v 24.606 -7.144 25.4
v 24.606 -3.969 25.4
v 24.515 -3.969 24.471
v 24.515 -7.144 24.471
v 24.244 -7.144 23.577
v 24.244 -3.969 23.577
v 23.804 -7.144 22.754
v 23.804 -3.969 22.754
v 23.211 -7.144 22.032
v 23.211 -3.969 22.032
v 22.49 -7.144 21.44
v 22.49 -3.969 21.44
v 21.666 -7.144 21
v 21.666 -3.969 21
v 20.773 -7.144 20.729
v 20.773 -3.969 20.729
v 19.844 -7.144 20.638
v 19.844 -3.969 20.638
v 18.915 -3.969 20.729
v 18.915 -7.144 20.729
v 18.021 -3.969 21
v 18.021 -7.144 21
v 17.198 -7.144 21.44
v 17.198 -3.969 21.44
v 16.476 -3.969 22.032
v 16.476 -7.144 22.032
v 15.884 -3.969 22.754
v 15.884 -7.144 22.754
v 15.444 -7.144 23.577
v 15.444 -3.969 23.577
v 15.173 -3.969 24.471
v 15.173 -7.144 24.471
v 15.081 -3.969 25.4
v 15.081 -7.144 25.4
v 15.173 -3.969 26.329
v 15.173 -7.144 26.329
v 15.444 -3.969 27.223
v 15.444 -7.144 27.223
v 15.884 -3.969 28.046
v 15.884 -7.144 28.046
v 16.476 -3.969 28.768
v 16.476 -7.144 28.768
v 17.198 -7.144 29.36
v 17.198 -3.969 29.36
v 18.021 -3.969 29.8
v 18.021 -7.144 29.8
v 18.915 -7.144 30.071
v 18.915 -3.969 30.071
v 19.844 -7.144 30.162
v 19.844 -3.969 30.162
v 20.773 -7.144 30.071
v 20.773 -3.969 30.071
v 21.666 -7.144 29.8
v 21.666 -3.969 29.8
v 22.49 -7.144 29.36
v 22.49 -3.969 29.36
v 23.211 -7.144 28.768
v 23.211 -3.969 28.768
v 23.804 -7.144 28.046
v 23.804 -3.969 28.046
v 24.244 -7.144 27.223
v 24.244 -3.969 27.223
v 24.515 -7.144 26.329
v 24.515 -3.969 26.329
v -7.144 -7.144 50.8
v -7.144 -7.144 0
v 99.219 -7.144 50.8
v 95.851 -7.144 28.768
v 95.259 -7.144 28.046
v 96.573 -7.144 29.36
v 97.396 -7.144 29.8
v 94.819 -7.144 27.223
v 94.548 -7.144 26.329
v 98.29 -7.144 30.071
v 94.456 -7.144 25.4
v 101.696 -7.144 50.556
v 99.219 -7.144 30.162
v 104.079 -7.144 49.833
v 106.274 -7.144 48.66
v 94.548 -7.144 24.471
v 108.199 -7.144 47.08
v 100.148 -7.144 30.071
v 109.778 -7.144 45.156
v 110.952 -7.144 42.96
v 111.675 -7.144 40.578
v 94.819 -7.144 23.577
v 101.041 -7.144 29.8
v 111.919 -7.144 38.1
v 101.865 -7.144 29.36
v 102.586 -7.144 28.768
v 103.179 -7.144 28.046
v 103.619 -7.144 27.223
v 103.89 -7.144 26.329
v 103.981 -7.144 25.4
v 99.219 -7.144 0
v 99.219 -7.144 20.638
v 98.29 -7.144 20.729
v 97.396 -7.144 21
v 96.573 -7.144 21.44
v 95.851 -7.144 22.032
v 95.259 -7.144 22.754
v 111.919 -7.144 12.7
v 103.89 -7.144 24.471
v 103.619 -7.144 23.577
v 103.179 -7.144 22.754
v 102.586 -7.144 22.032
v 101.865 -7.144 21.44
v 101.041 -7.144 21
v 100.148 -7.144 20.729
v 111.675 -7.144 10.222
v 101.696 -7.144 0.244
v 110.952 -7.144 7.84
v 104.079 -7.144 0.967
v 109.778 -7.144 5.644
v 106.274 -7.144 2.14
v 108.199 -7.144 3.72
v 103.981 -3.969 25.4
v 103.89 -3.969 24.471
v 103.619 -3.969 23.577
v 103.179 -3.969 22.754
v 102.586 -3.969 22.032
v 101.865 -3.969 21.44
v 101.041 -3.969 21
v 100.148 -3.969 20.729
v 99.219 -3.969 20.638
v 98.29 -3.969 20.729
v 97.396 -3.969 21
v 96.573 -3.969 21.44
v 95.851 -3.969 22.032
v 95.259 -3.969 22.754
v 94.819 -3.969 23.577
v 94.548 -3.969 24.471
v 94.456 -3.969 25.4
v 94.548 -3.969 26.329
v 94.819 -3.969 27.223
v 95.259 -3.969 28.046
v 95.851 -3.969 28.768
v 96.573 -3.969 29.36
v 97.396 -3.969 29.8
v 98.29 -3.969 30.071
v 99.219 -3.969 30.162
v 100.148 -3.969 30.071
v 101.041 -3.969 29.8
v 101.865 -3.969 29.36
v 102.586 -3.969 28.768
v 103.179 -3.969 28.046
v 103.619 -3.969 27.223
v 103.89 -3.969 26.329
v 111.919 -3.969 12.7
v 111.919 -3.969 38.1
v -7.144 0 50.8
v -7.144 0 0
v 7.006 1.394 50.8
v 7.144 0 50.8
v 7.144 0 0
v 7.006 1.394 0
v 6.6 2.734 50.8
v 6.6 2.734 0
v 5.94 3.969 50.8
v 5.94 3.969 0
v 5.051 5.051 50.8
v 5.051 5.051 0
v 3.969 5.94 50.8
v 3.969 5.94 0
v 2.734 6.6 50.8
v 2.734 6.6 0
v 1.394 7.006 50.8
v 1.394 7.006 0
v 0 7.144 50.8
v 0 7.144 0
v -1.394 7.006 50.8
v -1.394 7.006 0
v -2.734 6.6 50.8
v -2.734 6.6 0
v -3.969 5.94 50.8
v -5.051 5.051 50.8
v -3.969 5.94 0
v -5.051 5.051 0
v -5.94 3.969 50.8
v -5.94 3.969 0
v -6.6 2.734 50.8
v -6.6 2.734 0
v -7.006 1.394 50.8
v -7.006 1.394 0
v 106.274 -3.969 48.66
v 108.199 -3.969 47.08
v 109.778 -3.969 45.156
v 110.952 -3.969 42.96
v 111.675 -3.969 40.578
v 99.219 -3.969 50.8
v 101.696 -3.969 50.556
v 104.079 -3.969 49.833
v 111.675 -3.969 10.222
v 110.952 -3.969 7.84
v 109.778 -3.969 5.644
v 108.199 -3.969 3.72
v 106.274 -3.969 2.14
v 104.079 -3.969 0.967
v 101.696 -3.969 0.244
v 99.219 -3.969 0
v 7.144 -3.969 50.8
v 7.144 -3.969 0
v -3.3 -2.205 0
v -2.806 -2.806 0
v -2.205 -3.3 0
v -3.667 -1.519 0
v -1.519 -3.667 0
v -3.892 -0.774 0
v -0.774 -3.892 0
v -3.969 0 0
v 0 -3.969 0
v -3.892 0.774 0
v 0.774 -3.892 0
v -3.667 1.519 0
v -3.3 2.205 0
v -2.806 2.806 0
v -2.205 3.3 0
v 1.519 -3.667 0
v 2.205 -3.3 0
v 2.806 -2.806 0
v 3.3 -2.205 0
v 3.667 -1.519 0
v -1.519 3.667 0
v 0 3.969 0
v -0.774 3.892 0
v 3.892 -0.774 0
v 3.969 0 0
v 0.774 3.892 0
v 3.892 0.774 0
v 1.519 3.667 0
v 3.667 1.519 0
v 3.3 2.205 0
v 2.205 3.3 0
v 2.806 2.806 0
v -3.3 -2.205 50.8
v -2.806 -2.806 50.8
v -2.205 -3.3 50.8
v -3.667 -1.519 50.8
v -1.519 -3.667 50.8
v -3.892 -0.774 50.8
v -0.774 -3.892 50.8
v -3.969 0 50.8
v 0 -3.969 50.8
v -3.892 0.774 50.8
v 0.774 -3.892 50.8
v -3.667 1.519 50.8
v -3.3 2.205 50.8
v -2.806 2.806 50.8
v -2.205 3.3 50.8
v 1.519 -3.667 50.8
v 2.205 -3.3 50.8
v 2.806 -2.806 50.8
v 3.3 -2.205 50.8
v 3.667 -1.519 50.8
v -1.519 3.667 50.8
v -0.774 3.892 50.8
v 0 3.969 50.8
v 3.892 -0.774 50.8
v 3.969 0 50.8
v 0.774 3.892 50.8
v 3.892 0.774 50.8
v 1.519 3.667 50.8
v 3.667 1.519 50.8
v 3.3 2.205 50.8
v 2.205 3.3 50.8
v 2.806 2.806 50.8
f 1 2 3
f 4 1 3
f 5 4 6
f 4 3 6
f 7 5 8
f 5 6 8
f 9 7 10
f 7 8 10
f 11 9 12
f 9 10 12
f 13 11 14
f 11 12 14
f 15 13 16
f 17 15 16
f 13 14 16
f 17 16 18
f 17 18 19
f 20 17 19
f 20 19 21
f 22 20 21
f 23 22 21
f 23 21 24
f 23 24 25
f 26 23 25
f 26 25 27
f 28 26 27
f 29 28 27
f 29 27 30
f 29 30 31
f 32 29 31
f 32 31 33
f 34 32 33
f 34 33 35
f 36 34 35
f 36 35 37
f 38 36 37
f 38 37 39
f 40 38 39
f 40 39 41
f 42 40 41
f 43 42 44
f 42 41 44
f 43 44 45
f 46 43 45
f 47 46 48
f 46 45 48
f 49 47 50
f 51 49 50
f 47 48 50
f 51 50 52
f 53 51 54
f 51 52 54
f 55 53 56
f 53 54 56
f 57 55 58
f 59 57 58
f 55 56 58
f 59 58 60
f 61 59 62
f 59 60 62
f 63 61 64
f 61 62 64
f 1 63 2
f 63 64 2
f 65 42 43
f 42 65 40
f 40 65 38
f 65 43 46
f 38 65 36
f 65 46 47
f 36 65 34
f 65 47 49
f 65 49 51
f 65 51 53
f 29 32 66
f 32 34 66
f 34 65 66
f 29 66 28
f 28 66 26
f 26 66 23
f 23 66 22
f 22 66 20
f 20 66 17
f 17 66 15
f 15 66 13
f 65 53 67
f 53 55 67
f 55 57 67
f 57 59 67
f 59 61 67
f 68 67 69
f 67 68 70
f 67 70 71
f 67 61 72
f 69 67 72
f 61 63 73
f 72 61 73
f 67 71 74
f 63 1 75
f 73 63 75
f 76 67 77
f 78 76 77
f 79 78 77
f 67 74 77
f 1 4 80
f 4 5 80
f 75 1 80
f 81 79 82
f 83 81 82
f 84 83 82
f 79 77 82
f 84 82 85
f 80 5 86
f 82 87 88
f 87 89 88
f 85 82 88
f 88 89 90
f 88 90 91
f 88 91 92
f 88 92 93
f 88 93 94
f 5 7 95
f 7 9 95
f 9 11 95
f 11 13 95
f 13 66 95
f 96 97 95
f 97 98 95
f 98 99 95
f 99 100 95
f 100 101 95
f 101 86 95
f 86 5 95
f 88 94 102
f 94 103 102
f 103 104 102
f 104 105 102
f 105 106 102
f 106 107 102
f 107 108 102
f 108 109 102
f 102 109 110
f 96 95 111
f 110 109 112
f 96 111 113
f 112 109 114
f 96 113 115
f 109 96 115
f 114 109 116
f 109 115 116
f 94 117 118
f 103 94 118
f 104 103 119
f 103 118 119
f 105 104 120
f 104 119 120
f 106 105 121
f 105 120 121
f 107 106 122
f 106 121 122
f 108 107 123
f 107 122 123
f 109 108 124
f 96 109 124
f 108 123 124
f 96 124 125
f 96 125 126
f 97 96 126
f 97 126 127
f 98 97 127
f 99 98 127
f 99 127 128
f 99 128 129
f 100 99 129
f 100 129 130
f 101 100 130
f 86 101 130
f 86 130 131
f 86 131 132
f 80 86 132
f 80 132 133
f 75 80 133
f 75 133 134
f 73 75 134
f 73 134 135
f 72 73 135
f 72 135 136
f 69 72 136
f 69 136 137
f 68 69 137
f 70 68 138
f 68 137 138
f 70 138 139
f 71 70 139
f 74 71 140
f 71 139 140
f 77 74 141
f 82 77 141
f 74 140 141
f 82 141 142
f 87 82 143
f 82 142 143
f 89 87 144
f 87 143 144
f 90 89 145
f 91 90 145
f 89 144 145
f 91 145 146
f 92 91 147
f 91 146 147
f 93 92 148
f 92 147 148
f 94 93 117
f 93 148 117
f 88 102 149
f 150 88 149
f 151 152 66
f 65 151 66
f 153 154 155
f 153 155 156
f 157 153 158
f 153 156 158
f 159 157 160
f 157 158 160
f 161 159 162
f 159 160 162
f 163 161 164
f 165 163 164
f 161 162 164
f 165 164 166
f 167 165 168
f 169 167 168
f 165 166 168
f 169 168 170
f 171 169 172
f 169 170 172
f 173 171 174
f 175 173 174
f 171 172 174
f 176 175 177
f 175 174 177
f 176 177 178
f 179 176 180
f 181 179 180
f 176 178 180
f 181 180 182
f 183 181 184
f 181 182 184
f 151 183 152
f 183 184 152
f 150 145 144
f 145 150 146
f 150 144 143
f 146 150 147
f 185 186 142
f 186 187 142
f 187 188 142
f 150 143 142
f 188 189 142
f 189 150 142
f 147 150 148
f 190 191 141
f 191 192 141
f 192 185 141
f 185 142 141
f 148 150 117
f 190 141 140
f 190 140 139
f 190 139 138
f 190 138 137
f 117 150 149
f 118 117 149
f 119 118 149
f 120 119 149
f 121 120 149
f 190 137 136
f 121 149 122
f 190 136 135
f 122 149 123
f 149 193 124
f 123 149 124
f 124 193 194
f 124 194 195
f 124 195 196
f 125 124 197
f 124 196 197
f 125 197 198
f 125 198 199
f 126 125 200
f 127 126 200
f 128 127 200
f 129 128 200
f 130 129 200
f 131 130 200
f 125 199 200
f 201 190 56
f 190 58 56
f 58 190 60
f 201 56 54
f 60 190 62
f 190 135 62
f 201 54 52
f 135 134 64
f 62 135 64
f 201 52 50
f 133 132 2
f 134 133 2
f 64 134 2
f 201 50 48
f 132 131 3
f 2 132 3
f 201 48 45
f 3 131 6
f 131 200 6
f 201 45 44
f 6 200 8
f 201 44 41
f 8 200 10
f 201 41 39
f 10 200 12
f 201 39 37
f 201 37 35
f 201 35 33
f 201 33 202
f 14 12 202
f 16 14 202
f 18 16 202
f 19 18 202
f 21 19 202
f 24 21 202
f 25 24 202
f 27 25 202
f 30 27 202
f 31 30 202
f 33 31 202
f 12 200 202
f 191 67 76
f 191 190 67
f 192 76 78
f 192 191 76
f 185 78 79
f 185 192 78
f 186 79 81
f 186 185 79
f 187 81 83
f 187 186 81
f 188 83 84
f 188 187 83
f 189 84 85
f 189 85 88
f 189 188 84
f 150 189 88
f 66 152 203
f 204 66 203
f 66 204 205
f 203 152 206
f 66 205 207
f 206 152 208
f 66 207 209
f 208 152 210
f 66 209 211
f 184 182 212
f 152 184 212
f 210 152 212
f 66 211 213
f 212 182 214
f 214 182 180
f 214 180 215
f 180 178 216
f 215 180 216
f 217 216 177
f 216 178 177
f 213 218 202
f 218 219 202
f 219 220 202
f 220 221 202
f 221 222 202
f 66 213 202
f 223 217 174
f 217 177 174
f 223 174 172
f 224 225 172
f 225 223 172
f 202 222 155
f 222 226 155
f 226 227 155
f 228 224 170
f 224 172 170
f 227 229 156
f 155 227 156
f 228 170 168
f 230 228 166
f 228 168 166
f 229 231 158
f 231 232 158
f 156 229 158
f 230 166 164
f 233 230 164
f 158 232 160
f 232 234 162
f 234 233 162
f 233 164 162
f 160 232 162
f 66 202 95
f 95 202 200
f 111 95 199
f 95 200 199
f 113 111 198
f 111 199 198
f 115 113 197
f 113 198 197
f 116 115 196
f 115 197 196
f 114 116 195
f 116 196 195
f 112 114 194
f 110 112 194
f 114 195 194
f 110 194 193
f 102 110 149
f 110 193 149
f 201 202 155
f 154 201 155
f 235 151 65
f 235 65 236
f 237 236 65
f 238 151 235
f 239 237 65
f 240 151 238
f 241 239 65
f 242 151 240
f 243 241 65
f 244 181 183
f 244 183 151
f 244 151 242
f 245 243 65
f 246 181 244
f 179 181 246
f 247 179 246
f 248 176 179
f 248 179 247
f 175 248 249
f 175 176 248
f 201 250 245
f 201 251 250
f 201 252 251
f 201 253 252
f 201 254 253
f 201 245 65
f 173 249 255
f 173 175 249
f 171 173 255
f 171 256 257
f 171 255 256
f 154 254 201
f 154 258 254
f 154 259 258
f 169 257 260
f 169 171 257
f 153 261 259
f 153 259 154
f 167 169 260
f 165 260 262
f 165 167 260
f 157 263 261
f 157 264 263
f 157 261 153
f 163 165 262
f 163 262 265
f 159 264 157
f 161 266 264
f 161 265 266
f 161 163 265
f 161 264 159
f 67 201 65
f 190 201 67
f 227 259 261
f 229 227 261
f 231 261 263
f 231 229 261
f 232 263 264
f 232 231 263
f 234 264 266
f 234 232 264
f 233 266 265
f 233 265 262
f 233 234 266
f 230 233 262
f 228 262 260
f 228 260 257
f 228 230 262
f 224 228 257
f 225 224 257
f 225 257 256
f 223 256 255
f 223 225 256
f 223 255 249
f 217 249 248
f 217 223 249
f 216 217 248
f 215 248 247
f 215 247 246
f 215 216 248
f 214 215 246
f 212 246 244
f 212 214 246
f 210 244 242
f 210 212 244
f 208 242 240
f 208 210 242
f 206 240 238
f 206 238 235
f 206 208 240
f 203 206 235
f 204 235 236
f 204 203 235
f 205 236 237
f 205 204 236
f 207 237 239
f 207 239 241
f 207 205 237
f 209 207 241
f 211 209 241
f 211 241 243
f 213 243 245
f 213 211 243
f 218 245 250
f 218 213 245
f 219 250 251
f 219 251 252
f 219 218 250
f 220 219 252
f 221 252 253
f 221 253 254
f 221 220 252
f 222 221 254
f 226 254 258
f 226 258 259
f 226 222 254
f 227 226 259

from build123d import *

# Parameters (mm, degrees)
SKETCH1_R           = 3.96875
BOSS_EXTRUDE1_DEPTH = 50.8
SKETCH6_R           = 4.7625
CUT_EXTRUDE3_DEPTH  = 12.7
FILLET2_R           = 12.7


with BuildPart() as part:
    # Sketch1 → Boss-Extrude1 (new body)
    with BuildSketch(Plane.XY):
        with BuildLine():
            ThreePointArc((7.14375, 0), (0, 7.14375), (-7.14375, 0))
            Line((-7.14375, 0), (-7.14375, -7.14375))
            Line((-7.14375, -7.14375), (111.91875, -7.14375))
            Line((111.91875, -7.14375), (111.91875, -3.96875))
            Line((111.91875, -3.96875), (7.14375, -3.96875))
            Line((7.14375, -3.96875), (7.14375, 0))
        make_face()
        Circle(SKETCH1_R, mode=Mode.SUBTRACT)
    extrude(amount=BOSS_EXTRUDE1_DEPTH)

    # Sketch6 → Cut-Extrude3 (cut)
    with BuildSketch(Plane(origin=(0, -3.96875, 0), x_dir=(1, 0, 0), z_dir=(0, 1, 0))):
        with Locations((19.84375, -25.4)):
            Circle(SKETCH6_R)
        with Locations((99.21875, -25.4)):
            Circle(SKETCH6_R)
    extrude(amount=-CUT_EXTRUDE3_DEPTH, mode=Mode.SUBTRACT)

    # Fillet2
    fillet2_edges = [part.edges().sort_by_distance(p)[0] for p in [
        (111.91875, -5.55625, 0),
        (111.91875, -5.55625, 50.8),
    ]]
    fillet(fillet2_edges, radius=FILLET2_R)


solid = part.part
